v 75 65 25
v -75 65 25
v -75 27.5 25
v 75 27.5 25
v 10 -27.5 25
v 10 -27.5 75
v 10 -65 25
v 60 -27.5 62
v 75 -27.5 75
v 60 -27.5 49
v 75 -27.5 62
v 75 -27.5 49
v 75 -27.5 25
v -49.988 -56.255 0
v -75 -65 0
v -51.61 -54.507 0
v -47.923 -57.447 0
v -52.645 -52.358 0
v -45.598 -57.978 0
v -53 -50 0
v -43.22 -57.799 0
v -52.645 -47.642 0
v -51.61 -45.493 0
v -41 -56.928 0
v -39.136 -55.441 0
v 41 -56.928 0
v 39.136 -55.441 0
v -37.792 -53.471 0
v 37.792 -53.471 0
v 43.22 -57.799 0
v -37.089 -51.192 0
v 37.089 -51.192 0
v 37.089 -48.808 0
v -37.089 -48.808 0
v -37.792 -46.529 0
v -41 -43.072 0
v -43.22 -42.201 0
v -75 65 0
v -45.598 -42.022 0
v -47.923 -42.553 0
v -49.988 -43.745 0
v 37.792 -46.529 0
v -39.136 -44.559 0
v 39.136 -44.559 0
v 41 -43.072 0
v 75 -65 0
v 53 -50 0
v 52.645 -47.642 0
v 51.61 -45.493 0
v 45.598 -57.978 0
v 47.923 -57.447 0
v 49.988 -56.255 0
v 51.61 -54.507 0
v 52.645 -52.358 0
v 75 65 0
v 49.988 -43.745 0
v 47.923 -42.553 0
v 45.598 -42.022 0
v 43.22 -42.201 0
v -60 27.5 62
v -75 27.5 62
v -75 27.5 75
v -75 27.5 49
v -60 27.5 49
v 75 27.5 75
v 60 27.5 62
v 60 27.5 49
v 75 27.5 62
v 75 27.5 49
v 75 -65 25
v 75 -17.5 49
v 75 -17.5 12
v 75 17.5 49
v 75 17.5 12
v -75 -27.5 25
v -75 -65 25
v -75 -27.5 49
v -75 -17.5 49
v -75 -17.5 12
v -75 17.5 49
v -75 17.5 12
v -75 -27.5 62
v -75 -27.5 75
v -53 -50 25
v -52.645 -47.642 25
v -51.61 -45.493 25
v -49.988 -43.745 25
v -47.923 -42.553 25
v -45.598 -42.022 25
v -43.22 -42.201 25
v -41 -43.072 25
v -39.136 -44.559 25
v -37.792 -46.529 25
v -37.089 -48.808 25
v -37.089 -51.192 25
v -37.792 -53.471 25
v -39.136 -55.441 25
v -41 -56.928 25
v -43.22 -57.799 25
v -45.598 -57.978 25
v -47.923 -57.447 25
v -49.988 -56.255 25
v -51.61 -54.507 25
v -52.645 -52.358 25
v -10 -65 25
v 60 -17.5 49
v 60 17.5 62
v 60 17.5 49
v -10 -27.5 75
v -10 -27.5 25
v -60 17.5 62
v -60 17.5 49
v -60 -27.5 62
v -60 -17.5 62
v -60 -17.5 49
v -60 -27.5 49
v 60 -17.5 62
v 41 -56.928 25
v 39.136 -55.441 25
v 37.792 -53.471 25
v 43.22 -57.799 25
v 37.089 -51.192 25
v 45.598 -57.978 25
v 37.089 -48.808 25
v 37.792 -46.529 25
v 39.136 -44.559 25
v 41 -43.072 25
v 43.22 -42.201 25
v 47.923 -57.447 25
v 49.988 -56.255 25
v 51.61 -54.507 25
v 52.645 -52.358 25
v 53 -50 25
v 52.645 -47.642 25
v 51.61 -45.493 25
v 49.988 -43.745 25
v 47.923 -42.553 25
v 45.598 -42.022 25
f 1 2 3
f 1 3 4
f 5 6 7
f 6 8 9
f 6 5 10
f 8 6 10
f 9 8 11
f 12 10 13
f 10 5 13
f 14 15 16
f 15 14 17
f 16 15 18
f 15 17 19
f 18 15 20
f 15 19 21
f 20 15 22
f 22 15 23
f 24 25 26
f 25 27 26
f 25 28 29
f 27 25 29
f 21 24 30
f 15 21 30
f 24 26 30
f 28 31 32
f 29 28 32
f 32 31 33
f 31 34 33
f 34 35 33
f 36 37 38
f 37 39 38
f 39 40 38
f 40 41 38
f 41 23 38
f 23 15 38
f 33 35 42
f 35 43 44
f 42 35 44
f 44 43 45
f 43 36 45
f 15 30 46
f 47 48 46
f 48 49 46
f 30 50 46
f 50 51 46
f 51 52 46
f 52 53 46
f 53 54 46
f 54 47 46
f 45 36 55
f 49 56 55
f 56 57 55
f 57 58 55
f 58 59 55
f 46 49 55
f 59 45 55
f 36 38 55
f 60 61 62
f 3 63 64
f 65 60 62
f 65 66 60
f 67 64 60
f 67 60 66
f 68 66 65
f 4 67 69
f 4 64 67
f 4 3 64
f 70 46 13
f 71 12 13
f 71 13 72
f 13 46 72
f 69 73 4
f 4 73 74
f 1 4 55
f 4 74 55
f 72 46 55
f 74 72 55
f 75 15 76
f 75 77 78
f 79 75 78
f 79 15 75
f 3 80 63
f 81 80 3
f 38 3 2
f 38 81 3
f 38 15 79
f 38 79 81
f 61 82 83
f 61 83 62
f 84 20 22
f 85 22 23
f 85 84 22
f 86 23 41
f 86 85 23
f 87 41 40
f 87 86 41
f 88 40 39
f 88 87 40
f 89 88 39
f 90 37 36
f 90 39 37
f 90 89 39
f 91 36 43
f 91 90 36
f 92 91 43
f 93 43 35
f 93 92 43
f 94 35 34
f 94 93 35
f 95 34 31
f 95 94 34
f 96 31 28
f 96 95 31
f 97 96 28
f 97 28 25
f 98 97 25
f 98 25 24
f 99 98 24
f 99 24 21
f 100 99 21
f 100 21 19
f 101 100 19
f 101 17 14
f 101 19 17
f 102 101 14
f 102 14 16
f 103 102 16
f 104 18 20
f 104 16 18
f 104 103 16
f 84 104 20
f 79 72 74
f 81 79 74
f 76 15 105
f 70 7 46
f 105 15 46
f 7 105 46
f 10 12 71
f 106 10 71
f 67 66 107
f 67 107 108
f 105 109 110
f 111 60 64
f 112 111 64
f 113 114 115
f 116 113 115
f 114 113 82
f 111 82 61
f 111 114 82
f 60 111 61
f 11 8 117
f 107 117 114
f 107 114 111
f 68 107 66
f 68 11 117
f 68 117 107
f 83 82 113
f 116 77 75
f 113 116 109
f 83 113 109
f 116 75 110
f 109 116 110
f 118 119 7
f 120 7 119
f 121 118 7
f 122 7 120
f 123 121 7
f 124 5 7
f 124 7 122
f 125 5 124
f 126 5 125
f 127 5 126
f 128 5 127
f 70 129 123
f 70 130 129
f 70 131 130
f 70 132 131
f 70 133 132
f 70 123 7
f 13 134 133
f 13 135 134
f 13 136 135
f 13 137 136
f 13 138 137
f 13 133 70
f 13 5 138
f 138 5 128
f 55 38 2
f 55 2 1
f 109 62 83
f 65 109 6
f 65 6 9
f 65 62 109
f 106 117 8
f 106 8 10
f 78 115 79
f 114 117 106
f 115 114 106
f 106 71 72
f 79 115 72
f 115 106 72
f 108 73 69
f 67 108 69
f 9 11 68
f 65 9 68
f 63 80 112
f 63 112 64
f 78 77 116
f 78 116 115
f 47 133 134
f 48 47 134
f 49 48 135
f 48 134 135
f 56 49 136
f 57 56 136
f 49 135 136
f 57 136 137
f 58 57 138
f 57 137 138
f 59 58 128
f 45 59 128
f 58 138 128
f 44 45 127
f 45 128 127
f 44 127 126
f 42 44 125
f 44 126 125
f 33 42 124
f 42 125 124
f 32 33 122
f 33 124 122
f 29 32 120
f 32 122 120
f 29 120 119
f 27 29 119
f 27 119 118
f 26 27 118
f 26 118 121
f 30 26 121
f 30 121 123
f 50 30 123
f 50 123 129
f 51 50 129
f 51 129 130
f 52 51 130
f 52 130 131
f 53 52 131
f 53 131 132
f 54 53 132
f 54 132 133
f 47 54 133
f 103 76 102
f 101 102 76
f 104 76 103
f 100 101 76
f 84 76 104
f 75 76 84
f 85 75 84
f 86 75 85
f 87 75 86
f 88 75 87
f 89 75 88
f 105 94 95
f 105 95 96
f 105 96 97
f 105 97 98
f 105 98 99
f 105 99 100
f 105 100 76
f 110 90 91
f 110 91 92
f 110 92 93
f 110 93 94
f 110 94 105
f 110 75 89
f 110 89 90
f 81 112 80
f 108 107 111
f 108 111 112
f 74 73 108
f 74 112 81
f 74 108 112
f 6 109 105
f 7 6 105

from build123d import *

# Parameters (mm, degrees)
SKETCH_1_W          = 150
SKETCH_1_H          = 130
EXTRUDE_1_DEPTH     = 25
SKETCH_2_W          = 150
SKETCH_2_H          = 55
EXTRUDE_2_DEPTH     = 50
SKETCH_4_R          = 8
CUT_EXTRUDE_2_DEPTH = 112.130553854
RIB_1_REACH         = 126.399
SKETCH_5_WALL_W     = 313.297106092
SKETCH_5_WALL_H     = 20
SKETCH_6_W          = 50
SKETCH_6_H          = 35
CUT_EXTRUDE_3_DEPTH = 180.861057486
SKETCH_8_W          = 13
SKETCH_8_H          = 55
CUT_EXTRUDE_4_DEPTH = 15


with BuildPart() as part:
    # Эскиз1 → Бобышка-Вытянуть1 (new body)
    with BuildSketch(Plane.XY):
        Rectangle(SKETCH_1_W, SKETCH_1_H)
    extrude(amount=EXTRUDE_1_DEPTH)

    # Эскиз2 → Бобышка-Вытянуть2 (add)
    with BuildSketch(Plane.XY.offset(25)):
        Rectangle(SKETCH_2_W, SKETCH_2_H)
    extrude(amount=EXTRUDE_2_DEPTH)

    # Эскиз4 → Вырез-Вытянуть2 (cut, through all)
    with BuildSketch(Plane.XY.offset(25)):
        with Locations((45, -50)):
            Circle(SKETCH_4_R)
    cut_extrude_2 = extrude(amount=-CUT_EXTRUDE_2_DEPTH, mode=Mode.SUBTRACT)

    # Эскиз5 wall → Ребро1 (add, up to next)
    with BuildSketch(Plane(origin=(0, -46.25, 50), x_dir=(0, -0.6, -0.8), z_dir=(0, 0.8, -0.6)), mode=Mode.PRIVATE) as rib_1_sk1:
        Rectangle(SKETCH_5_WALL_W, SKETCH_5_WALL_H)
    rib_1_tool1 = extrude(rib_1_sk1.sketch, amount=RIB_1_REACH, mode=Mode.PRIVATE) - part.part
    add(rib_1_tool1.solids().sort_by_distance((0, -46.25, 50))[0])

    # Зеркальное отражение1: Вырез-Вытянуть2 across plane
    add(cut_extrude_2.mirror(Plane(origin=(0, 0, 0), x_dir=(0, 0, 1), z_dir=(1, 0, 0))), mode=Mode.SUBTRACT)

    # Эскиз6 → Вырез-Вытянуть3 (cut, through all)
    with BuildSketch(Plane(origin=(75, 0, 0), x_dir=(0, 0, -1), z_dir=(1, 0, 0))):
        with Locations((-37, 0)):
            Rectangle(SKETCH_6_W, SKETCH_6_H)
    extrude(amount=-CUT_EXTRUDE_3_DEPTH, mode=Mode.SUBTRACT)

    # Эскиз8 → Вырез-Вытянуть4 (cut)
    with BuildSketch(Plane(origin=(75, 0, 0), x_dir=(0, 0, -1), z_dir=(1, 0, 0))):
        with Locations((-55.5, 0)):
            Rectangle(SKETCH_8_W, SKETCH_8_H)
    cut_extrude_4 = extrude(amount=-CUT_EXTRUDE_4_DEPTH, mode=Mode.SUBTRACT)

    # Зеркальное отражение2: Вырез-Вытянуть4 across plane
    add(cut_extrude_4.mirror(Plane(origin=(0, 0, 0), x_dir=(0, 0, 1), z_dir=(1, 0, 0))), mode=Mode.SUBTRACT)


solid = part.part
